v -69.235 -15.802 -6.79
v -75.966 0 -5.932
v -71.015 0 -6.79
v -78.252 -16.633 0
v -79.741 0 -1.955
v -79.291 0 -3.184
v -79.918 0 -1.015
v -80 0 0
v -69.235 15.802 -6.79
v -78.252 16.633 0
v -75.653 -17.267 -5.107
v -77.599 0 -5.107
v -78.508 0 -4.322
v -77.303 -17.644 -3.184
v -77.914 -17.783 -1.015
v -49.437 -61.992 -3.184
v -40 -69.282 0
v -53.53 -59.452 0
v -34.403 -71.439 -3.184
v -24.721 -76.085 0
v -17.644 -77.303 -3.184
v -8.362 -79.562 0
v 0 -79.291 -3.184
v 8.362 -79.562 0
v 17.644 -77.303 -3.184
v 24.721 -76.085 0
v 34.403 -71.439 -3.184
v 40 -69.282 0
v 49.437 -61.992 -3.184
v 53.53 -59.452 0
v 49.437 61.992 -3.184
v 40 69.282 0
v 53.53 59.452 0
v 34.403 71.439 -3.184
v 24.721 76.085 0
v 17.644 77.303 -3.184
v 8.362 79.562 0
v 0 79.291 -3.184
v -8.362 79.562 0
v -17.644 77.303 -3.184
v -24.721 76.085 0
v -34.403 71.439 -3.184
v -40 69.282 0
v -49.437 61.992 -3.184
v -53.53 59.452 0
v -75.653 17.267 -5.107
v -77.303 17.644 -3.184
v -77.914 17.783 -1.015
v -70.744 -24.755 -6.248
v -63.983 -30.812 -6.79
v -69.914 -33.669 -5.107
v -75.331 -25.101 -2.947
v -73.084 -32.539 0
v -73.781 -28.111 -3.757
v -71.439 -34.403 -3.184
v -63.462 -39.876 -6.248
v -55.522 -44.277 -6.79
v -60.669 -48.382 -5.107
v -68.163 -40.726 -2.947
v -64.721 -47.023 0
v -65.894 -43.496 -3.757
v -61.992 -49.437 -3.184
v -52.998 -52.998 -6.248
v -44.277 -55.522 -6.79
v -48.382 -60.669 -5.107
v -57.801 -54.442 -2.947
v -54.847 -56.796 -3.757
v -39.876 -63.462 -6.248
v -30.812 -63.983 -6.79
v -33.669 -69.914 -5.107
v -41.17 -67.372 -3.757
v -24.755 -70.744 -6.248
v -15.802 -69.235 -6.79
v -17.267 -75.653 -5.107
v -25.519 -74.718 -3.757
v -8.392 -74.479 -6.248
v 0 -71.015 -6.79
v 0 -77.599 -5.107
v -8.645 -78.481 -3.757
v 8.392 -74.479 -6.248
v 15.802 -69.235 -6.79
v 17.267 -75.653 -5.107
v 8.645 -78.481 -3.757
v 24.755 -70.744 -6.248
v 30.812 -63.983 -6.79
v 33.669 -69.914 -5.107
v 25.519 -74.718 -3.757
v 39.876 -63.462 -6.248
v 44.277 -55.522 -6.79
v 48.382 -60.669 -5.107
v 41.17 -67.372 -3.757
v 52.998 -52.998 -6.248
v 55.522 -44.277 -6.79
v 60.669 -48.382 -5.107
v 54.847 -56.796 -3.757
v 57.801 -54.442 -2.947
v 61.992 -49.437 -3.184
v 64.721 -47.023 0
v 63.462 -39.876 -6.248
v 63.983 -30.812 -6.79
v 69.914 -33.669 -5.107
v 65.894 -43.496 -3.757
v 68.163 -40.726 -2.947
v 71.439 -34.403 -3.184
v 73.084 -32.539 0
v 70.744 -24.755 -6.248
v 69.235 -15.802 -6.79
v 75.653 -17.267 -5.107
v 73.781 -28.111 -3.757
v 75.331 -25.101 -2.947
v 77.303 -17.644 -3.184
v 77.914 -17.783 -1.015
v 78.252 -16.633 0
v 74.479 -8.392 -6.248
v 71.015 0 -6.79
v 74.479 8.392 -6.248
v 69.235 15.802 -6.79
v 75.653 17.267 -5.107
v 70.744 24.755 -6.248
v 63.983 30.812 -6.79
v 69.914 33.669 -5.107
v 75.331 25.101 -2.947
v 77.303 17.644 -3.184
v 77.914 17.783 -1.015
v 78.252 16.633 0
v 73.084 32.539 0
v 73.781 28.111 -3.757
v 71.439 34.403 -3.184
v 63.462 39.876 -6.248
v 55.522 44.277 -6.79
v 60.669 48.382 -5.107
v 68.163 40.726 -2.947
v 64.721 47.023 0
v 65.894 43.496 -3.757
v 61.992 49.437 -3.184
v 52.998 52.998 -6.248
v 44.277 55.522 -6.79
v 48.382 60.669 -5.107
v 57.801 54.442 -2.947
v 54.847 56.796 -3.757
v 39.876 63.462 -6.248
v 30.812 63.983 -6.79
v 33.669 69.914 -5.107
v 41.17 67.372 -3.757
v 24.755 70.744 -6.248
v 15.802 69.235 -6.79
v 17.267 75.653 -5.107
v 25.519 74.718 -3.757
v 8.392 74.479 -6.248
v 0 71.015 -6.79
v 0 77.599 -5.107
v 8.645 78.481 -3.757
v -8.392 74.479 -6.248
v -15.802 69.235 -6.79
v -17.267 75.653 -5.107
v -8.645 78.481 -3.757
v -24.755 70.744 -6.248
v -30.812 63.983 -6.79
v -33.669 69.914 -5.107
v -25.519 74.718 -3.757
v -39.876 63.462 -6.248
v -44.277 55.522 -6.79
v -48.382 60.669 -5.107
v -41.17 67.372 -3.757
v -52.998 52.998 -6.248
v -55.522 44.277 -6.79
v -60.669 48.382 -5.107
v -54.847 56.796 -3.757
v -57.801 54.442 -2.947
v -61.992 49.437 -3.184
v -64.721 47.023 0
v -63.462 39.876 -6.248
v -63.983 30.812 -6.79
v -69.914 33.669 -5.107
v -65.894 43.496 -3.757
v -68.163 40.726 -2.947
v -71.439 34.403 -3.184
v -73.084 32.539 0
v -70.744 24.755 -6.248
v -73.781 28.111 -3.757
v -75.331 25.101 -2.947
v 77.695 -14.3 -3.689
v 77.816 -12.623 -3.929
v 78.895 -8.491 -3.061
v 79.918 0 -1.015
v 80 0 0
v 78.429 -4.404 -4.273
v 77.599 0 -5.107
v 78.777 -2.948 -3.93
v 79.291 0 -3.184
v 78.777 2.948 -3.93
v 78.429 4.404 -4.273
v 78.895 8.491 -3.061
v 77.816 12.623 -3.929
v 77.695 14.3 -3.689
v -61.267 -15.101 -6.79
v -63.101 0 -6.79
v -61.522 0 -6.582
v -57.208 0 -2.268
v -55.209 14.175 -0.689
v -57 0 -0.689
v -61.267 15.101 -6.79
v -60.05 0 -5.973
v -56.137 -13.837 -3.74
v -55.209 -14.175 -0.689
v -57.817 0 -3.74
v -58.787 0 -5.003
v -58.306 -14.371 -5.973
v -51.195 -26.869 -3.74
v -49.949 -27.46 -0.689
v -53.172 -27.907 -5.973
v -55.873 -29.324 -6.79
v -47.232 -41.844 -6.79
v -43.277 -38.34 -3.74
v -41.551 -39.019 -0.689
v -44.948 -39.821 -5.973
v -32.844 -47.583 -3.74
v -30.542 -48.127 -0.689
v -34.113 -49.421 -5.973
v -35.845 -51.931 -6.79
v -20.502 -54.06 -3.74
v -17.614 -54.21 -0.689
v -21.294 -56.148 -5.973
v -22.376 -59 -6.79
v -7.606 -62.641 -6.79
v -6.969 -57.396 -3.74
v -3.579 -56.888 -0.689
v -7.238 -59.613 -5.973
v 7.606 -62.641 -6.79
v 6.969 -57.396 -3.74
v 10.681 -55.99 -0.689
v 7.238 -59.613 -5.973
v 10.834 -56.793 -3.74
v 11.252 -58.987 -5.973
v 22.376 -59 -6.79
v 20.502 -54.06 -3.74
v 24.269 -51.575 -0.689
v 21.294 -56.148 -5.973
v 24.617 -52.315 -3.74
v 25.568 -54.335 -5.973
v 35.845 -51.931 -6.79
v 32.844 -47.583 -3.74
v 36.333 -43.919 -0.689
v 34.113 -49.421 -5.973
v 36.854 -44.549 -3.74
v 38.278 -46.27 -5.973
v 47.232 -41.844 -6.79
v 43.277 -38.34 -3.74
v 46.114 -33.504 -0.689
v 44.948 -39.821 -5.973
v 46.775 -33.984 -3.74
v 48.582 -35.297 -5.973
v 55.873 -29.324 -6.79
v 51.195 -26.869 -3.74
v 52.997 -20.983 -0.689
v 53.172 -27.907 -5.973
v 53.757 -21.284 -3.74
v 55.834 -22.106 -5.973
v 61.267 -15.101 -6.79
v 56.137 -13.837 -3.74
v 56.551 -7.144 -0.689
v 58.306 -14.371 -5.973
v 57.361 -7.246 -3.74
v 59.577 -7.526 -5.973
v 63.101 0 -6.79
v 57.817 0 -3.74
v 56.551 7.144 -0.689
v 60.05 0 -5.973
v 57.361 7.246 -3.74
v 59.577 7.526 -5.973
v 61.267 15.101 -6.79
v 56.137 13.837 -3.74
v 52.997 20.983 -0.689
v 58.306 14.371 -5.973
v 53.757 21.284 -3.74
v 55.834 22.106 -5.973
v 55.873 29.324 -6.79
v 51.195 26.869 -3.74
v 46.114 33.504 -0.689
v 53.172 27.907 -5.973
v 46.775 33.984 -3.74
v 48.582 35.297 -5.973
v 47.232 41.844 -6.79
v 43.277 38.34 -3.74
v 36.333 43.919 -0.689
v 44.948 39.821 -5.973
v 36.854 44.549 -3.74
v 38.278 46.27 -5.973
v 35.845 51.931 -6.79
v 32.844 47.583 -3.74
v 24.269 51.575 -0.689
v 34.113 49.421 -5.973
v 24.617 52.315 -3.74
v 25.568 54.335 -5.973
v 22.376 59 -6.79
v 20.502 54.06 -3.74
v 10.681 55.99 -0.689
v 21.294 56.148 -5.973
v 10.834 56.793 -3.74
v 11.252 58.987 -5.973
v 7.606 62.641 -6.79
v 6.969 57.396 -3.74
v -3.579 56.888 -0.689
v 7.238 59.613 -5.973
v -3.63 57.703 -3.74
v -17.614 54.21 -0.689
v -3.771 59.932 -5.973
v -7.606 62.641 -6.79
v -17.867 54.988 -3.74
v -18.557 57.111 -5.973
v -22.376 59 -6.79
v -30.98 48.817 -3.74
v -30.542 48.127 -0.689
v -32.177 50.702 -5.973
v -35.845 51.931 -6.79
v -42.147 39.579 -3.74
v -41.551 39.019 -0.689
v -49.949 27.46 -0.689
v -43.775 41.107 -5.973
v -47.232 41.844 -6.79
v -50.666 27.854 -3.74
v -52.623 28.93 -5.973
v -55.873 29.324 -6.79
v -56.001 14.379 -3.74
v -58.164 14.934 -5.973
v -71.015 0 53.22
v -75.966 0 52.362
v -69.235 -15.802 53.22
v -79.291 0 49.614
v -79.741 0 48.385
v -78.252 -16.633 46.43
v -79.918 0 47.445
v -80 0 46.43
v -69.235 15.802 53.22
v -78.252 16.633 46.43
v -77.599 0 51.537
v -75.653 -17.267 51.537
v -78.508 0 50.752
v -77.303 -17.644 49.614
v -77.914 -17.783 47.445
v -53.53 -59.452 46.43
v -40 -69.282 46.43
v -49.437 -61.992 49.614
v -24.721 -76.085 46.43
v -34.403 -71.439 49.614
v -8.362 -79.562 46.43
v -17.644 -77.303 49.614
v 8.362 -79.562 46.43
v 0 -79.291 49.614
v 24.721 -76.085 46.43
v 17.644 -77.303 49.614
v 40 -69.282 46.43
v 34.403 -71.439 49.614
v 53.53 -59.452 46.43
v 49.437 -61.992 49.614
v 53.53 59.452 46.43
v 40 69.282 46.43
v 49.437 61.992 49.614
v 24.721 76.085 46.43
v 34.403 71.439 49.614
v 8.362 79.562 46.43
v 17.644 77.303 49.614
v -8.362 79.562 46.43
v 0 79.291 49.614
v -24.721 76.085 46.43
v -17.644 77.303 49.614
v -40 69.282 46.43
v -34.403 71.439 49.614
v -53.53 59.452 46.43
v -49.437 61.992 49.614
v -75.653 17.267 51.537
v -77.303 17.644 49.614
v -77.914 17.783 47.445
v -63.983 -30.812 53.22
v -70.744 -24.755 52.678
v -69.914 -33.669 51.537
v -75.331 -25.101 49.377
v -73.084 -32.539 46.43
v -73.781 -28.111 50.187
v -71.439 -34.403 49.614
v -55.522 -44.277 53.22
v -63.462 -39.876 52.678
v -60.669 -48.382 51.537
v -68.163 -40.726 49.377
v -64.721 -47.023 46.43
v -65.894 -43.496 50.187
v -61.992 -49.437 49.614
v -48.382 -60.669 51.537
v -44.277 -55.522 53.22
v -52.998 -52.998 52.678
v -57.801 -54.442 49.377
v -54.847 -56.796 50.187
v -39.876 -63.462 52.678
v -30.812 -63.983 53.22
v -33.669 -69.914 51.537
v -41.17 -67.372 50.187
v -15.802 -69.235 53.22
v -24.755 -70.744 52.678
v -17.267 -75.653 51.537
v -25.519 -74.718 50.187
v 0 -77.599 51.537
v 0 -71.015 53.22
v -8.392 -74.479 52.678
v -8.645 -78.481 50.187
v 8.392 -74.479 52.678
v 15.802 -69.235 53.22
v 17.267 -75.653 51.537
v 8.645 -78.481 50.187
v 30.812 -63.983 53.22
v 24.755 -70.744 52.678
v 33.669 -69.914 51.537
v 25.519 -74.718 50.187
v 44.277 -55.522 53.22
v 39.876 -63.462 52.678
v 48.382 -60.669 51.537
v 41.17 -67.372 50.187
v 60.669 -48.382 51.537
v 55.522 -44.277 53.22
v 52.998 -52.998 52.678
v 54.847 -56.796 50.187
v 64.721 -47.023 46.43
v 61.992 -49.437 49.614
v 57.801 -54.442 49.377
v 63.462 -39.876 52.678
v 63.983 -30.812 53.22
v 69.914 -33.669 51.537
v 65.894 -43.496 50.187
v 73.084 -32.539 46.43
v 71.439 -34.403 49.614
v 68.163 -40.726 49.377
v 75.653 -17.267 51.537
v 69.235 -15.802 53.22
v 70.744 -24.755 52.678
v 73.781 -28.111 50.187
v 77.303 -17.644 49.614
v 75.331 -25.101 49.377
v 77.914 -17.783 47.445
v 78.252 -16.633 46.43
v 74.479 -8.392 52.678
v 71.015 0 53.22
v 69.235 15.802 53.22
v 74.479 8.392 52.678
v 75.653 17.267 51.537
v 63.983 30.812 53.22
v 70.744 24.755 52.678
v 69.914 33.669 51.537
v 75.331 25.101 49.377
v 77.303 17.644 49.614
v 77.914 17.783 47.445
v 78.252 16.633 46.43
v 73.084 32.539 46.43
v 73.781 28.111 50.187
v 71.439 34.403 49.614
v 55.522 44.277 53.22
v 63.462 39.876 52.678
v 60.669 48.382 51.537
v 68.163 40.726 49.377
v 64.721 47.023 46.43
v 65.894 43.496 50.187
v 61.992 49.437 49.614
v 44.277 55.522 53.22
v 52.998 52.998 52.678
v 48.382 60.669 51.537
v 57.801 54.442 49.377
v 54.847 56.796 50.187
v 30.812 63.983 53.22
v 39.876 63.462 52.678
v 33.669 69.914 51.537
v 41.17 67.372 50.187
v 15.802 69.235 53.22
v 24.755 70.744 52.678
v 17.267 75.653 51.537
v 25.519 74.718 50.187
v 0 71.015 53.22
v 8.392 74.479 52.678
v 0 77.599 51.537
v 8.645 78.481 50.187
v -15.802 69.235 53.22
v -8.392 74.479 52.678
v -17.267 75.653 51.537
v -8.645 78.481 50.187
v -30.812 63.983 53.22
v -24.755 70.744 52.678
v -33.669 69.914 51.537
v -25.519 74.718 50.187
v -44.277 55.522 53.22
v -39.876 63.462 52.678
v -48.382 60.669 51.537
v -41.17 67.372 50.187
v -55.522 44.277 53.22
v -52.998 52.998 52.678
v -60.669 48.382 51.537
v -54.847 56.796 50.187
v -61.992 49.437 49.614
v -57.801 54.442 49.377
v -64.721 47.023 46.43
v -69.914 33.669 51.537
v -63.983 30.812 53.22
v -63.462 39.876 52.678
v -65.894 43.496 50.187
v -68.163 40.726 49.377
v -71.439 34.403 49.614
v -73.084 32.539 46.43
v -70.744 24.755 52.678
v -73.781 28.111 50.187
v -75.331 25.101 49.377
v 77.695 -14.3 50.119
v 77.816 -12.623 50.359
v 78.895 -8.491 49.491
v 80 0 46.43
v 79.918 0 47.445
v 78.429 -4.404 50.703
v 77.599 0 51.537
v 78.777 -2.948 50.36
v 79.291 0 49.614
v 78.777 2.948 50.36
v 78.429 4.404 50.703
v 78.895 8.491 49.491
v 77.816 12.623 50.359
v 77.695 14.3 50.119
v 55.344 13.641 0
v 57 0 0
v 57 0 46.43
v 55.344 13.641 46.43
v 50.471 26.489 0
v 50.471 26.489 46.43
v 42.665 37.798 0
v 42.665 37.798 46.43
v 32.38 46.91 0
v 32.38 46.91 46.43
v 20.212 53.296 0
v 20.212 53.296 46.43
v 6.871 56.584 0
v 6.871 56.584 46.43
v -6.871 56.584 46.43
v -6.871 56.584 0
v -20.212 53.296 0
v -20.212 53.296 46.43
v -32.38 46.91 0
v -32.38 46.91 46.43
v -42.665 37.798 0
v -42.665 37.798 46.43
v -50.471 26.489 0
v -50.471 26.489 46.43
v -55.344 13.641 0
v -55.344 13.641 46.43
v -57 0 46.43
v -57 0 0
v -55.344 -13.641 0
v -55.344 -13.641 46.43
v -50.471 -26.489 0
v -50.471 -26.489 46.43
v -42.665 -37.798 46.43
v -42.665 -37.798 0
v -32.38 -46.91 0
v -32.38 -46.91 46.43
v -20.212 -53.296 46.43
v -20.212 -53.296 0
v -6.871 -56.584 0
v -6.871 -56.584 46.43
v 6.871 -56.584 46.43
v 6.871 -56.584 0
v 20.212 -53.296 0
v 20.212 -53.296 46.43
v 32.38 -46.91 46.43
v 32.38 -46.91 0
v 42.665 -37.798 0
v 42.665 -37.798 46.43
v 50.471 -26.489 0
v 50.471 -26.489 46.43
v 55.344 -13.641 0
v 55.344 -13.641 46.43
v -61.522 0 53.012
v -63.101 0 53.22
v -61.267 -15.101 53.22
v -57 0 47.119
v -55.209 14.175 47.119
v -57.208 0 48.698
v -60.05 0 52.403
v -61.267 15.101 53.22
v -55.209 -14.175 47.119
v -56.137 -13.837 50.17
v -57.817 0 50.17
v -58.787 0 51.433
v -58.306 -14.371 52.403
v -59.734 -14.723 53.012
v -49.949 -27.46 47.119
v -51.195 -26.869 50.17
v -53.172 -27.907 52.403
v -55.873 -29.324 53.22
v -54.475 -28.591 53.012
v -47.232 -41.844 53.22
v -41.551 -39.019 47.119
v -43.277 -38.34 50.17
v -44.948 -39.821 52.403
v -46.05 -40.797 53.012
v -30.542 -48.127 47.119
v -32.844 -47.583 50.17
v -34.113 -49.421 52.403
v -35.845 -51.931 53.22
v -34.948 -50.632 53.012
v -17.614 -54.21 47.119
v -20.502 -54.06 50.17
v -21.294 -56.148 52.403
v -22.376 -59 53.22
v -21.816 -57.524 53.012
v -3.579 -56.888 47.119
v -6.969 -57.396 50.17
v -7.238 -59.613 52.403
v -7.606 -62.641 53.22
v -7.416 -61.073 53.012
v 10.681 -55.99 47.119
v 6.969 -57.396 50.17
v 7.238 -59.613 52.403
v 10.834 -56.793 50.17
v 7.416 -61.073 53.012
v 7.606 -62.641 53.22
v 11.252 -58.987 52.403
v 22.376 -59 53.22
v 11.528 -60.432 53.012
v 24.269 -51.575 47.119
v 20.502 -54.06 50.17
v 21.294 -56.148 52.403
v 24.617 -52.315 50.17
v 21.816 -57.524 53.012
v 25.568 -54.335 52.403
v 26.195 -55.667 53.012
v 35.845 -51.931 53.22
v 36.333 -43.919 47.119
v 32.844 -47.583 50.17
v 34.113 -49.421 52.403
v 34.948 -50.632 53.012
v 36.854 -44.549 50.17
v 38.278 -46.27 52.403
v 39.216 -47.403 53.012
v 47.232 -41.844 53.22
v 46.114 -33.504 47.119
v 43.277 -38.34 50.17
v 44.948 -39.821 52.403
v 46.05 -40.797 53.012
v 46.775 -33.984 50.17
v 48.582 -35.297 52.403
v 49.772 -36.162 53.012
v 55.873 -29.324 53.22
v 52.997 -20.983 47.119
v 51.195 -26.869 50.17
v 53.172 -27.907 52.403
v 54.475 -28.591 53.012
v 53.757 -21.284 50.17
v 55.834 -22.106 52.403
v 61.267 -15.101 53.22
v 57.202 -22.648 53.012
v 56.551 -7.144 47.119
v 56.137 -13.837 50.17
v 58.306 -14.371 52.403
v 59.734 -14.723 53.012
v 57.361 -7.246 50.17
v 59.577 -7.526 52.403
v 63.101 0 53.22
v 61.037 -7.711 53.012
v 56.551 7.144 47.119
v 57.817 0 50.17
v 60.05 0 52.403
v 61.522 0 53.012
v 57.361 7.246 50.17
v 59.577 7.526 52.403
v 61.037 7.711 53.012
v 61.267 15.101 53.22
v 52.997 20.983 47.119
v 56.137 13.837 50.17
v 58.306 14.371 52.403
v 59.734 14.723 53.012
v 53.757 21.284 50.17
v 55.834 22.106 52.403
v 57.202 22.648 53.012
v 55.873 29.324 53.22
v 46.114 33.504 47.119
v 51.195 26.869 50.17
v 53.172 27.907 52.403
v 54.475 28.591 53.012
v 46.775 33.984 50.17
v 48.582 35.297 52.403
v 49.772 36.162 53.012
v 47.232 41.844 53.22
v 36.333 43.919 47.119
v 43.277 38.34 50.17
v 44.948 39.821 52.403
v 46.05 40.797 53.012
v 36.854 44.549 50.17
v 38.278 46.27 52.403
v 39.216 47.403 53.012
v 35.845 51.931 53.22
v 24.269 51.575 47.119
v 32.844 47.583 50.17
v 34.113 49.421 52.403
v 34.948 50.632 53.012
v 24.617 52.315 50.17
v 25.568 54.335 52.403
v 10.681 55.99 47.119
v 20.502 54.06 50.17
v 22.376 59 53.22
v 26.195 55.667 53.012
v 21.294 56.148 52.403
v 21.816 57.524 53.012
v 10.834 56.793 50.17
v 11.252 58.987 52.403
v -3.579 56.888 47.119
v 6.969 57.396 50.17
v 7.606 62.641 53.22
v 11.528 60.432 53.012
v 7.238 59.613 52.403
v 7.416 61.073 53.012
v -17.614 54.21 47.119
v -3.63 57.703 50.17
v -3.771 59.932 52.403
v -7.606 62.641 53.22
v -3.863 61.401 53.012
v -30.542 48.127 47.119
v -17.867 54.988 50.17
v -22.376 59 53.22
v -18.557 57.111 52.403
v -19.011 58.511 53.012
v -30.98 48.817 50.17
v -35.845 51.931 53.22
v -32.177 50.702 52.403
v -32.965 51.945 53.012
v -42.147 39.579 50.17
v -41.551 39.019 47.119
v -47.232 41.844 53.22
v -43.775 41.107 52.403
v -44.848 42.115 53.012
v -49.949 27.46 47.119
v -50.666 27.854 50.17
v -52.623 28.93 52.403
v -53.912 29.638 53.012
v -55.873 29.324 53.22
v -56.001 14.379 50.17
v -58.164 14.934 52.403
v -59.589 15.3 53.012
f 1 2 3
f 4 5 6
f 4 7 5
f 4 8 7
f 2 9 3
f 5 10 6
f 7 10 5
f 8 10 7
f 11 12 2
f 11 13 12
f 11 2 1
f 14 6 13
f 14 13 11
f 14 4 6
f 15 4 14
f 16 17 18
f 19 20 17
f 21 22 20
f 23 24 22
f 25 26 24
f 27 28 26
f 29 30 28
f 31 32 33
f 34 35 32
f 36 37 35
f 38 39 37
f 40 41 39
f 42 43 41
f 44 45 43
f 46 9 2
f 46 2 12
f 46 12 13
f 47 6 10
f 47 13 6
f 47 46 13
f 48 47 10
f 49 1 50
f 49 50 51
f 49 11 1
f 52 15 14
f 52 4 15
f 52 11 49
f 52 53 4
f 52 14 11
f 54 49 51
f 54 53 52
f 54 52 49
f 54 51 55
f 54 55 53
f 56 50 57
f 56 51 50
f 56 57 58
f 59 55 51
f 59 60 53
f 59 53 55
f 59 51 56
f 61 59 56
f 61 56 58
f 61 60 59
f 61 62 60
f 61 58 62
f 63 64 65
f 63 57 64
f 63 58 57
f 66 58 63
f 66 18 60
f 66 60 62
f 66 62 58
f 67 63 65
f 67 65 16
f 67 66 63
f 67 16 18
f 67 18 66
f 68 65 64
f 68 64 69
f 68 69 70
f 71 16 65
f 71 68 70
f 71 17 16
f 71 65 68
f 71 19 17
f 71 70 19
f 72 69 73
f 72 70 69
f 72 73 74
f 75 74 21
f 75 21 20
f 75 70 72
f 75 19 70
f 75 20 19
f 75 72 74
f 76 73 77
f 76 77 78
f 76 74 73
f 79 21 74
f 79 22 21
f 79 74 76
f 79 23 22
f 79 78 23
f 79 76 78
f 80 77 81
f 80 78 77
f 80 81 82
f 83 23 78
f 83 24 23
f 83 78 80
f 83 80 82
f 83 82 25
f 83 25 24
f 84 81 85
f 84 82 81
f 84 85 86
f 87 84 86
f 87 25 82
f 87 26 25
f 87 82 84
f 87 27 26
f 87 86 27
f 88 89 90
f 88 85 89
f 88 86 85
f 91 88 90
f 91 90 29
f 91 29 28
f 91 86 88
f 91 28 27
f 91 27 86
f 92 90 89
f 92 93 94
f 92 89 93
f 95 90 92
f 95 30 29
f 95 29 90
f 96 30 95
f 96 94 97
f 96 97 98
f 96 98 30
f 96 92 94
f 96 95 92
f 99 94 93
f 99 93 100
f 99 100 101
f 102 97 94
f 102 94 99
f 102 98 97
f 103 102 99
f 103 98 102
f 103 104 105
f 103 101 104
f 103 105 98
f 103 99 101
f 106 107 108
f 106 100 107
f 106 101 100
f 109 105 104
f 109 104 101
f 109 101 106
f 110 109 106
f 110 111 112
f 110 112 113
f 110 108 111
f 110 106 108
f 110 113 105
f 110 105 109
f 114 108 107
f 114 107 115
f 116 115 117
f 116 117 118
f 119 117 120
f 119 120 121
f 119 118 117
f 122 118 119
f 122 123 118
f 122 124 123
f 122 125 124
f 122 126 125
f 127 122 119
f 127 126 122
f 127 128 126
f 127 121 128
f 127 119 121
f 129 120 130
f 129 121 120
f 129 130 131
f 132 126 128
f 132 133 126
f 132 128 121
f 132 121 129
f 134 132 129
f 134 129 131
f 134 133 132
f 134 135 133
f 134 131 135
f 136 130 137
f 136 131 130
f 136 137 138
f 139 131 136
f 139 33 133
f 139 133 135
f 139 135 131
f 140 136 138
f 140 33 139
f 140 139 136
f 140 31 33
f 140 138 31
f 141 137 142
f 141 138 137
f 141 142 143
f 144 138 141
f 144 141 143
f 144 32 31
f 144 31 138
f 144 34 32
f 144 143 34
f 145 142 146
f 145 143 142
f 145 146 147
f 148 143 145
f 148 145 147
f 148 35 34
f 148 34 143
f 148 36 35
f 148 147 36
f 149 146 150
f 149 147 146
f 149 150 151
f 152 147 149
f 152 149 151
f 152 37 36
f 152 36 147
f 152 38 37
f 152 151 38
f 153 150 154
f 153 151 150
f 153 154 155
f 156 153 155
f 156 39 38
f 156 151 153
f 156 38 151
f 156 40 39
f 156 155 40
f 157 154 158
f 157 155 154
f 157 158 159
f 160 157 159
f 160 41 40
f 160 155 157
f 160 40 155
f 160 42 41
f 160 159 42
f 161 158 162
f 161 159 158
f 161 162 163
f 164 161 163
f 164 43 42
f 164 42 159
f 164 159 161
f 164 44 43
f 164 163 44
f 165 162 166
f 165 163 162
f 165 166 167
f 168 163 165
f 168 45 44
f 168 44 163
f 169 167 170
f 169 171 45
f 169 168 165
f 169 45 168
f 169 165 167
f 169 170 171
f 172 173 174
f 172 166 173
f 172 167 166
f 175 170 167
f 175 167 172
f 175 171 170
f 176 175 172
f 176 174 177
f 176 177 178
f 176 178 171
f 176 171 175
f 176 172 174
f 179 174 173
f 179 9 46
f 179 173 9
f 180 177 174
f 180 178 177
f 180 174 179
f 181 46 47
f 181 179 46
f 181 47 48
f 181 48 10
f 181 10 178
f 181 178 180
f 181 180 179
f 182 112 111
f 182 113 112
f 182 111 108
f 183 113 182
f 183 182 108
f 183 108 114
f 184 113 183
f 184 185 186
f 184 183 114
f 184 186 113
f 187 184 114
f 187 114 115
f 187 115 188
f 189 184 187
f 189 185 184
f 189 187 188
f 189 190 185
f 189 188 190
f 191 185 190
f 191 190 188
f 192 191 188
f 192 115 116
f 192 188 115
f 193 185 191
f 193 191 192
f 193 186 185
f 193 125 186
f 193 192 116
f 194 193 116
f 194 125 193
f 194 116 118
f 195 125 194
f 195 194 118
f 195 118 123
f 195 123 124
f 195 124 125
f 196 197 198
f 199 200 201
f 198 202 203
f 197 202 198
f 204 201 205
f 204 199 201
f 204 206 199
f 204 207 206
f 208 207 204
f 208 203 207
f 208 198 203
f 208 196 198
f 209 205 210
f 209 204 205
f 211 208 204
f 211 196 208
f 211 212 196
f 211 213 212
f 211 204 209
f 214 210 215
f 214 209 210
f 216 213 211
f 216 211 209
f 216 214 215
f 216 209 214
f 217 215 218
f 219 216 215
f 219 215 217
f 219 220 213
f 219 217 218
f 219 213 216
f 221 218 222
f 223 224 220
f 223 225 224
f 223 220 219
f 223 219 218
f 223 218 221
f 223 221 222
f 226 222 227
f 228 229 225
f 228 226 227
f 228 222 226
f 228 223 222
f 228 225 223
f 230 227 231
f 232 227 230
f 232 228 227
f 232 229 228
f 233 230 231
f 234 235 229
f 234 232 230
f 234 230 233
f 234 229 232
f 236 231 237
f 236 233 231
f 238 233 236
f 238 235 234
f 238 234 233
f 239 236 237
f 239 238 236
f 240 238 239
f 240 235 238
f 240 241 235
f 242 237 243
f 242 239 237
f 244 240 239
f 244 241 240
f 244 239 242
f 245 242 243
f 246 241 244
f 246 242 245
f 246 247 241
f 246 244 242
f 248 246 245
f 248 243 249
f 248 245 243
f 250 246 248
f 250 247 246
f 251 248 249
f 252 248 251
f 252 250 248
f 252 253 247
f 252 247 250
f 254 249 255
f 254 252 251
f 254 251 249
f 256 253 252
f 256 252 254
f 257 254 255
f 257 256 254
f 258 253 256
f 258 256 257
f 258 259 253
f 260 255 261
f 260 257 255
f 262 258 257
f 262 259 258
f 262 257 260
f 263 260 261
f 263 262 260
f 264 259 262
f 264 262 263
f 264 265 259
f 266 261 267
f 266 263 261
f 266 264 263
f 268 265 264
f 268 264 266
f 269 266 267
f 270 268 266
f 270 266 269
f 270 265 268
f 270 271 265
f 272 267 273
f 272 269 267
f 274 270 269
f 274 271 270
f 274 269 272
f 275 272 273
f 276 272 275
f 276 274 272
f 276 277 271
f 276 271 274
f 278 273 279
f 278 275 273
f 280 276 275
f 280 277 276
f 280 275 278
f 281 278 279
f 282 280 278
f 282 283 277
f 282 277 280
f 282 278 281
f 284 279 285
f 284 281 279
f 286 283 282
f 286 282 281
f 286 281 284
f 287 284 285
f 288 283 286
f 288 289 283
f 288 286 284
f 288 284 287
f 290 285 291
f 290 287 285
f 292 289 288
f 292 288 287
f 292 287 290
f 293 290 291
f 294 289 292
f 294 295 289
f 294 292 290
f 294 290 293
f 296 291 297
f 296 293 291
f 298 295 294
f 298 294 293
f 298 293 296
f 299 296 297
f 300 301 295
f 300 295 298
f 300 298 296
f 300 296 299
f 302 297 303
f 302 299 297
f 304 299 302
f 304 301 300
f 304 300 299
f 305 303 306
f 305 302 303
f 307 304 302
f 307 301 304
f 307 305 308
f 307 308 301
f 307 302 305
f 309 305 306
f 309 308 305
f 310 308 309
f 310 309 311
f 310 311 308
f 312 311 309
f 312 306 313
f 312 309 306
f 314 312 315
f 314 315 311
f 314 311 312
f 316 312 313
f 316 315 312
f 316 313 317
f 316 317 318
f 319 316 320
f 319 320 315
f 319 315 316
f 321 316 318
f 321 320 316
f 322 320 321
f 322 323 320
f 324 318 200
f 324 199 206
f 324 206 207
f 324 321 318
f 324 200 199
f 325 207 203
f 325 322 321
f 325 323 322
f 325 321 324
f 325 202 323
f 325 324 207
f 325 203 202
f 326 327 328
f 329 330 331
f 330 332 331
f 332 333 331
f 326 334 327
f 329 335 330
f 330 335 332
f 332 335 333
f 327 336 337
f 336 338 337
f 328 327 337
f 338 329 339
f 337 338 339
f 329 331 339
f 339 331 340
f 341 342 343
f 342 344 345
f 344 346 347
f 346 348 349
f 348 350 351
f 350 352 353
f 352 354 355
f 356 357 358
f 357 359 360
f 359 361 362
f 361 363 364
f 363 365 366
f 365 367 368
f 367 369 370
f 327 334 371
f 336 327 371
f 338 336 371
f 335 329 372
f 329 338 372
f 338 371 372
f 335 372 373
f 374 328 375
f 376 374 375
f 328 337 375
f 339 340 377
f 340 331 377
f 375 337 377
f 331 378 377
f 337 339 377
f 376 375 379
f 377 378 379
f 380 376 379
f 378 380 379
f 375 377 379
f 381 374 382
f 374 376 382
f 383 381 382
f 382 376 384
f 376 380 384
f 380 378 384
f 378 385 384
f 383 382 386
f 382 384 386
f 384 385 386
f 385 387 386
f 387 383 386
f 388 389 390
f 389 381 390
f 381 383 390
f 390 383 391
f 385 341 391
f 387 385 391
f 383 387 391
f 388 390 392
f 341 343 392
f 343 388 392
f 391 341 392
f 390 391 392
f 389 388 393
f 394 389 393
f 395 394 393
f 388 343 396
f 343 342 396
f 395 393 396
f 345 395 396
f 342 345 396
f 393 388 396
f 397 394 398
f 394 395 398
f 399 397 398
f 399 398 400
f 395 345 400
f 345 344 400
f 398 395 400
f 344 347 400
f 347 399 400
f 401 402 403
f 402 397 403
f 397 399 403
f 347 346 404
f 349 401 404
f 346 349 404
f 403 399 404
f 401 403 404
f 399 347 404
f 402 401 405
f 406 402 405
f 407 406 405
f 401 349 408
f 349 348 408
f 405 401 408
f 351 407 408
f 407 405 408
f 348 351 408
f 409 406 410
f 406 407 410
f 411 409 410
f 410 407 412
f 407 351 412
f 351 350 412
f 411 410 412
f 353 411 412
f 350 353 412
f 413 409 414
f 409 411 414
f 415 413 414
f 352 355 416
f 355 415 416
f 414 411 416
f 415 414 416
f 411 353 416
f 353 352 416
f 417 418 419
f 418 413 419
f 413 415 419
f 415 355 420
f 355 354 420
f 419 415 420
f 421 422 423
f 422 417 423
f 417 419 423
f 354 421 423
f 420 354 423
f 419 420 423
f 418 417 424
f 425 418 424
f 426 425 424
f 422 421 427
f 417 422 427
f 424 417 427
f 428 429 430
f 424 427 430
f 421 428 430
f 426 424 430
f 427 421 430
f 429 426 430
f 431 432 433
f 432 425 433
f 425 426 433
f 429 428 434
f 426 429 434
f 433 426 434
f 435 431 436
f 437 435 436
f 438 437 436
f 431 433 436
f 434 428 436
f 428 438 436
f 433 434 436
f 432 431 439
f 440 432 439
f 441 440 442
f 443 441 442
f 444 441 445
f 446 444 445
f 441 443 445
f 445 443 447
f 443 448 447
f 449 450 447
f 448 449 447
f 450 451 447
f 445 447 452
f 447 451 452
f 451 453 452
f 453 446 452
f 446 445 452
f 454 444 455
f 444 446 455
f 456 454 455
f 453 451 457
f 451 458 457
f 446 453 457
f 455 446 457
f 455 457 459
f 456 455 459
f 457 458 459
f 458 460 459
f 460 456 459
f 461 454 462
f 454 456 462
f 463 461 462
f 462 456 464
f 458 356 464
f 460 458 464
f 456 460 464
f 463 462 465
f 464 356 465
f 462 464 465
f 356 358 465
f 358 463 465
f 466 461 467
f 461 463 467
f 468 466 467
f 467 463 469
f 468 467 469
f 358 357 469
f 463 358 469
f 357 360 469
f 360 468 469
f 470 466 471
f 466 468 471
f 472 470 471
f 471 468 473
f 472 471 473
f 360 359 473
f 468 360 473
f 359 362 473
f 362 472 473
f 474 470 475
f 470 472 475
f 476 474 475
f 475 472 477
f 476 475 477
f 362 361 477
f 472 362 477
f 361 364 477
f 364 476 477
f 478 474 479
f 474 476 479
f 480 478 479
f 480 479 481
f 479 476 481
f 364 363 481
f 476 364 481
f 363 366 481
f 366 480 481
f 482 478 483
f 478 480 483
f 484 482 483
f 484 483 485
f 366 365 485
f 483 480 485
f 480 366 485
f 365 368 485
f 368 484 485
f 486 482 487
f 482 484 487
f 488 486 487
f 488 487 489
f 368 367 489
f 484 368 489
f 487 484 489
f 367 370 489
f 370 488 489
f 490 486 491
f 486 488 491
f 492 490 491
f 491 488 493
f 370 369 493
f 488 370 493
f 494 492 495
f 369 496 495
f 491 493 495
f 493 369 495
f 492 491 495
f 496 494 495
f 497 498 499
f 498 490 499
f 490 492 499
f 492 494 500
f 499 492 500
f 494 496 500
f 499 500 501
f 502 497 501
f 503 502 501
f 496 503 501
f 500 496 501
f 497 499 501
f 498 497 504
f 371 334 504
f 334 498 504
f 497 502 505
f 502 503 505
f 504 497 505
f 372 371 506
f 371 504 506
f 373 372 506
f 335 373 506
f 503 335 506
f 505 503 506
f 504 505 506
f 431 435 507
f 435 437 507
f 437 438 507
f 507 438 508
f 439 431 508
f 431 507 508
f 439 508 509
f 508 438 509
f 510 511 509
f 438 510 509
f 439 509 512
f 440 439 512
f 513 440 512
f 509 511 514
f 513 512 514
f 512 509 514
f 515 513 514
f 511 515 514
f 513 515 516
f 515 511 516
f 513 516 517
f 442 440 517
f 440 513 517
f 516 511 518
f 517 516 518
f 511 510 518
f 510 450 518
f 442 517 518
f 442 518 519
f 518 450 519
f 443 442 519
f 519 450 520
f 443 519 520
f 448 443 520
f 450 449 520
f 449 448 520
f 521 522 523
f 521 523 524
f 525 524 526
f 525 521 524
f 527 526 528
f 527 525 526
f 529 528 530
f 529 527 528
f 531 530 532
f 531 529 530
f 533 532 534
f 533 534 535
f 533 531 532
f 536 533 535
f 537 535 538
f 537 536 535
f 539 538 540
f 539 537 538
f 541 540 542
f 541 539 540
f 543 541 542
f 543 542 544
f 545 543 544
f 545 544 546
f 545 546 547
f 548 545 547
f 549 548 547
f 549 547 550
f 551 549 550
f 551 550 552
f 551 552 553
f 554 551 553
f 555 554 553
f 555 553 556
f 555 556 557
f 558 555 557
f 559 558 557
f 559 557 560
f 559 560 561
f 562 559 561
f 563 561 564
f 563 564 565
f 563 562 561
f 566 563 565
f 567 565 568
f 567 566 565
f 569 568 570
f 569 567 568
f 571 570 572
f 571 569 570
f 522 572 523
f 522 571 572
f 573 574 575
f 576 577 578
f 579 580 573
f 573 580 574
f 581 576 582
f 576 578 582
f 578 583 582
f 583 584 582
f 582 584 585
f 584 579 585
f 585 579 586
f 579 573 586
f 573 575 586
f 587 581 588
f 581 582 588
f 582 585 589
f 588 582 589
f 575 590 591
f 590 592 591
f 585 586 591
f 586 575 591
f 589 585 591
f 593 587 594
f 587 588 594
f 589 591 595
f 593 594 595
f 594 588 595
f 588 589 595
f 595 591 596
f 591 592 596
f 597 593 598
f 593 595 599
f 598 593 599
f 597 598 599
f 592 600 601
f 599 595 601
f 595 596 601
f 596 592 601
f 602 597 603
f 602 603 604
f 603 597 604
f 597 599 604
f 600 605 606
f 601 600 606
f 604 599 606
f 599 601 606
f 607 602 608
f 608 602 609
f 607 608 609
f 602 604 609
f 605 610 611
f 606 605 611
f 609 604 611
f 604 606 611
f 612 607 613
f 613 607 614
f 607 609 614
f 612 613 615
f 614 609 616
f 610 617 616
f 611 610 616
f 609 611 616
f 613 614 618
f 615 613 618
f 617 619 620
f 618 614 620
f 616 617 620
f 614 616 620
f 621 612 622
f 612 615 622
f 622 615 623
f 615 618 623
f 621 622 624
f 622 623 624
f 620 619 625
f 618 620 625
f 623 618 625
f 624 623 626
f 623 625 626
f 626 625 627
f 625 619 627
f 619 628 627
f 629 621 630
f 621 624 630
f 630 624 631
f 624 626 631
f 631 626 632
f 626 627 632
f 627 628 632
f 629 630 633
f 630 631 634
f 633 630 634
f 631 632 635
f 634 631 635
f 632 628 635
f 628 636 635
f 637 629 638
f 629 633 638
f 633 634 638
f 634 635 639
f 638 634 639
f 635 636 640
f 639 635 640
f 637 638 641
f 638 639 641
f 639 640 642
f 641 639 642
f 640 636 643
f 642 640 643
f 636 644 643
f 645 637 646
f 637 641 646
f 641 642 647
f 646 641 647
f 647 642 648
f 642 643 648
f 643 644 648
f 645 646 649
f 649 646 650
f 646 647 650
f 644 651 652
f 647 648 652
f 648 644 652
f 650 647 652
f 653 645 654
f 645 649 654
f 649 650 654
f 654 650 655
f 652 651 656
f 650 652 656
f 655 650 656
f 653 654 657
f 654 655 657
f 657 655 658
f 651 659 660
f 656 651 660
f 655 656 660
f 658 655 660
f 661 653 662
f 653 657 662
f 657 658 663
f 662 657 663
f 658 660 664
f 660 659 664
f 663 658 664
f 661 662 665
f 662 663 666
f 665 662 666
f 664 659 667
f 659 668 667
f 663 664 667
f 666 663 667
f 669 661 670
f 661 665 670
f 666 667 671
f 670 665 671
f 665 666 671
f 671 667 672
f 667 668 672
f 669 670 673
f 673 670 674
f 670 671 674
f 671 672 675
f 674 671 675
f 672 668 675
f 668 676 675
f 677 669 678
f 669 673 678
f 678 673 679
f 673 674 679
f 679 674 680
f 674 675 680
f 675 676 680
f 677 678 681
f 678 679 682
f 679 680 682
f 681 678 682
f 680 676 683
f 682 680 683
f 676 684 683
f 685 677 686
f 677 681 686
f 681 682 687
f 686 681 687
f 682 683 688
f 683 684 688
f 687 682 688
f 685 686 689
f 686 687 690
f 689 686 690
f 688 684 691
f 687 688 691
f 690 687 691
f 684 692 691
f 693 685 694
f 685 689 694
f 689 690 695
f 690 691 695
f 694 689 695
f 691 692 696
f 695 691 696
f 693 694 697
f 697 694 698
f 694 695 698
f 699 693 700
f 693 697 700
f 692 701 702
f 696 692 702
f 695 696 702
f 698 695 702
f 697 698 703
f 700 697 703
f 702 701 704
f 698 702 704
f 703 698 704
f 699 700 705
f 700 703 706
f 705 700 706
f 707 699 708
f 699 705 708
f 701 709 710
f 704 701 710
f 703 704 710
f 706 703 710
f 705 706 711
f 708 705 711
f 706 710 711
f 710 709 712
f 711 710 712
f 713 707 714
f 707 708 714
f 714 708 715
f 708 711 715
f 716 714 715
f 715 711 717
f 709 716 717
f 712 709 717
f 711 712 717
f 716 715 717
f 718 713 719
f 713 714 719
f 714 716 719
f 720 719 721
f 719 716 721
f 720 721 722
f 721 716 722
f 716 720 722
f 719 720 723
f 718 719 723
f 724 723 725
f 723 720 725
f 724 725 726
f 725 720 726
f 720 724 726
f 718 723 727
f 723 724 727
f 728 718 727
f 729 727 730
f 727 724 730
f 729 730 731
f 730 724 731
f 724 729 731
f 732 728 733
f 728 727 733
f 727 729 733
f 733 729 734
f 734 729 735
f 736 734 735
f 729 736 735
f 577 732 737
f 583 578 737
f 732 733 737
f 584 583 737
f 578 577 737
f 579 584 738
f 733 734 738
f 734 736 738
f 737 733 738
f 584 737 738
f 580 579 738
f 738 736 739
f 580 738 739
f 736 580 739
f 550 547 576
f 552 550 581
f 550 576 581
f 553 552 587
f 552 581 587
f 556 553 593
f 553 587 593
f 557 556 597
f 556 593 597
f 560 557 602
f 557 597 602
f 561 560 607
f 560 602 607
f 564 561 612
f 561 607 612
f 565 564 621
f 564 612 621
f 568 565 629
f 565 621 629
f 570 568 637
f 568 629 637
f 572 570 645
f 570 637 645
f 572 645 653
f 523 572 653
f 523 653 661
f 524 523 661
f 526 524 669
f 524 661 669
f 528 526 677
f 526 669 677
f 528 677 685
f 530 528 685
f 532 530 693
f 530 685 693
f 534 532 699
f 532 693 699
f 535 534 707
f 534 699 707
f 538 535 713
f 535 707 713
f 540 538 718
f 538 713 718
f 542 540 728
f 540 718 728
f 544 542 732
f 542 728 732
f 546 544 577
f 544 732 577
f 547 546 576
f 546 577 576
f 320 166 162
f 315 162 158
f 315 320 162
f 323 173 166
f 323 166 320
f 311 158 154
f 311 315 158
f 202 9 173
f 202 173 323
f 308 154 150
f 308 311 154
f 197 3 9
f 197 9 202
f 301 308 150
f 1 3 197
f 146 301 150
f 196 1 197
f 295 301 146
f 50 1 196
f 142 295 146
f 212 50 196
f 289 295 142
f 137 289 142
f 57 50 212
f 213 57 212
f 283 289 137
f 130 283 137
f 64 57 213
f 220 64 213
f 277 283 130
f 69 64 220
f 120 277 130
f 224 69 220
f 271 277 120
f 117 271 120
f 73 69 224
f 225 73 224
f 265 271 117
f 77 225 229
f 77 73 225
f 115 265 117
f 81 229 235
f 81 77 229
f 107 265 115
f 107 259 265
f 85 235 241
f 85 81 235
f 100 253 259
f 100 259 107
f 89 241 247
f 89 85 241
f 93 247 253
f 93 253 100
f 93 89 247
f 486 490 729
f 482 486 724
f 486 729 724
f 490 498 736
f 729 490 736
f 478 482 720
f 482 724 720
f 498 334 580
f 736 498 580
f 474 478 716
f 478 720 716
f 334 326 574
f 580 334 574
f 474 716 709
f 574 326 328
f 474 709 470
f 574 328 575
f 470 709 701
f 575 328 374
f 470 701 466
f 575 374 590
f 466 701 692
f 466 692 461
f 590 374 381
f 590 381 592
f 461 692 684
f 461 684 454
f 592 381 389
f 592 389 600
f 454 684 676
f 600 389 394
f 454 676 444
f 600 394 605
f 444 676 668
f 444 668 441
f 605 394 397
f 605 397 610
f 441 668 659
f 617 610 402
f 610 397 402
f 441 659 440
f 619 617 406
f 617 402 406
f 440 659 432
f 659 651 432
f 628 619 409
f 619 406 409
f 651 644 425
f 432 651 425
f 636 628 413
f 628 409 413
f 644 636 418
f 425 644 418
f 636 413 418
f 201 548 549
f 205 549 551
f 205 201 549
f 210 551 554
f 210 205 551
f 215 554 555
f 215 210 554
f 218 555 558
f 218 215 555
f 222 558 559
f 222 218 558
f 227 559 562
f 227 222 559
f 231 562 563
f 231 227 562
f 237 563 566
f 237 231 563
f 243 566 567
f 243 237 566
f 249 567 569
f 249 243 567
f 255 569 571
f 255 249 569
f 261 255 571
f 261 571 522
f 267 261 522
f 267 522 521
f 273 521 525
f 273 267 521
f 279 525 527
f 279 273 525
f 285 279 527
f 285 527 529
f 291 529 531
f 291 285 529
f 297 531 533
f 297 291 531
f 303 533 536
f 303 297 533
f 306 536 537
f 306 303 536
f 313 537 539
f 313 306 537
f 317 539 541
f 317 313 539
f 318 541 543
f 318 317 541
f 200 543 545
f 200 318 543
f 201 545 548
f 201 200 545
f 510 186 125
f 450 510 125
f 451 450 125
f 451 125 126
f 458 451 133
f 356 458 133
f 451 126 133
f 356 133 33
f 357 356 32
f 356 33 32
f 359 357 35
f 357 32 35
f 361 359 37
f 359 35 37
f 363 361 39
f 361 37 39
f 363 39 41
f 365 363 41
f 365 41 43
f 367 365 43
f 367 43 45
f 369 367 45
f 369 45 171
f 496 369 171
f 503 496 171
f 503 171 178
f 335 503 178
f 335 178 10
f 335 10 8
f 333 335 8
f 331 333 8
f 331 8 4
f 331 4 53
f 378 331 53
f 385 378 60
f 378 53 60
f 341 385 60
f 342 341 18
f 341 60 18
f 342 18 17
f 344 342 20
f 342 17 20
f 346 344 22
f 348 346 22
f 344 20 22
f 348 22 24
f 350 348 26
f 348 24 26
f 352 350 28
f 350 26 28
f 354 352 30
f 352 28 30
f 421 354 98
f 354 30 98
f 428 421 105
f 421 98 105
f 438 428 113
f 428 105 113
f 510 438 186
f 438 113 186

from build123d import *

# Parameters (mm, degrees)
ESQUISSE1_R        = 80
ESQUISSE1_R_2      = 57
BOSS_EXTRU_1_DEPTH = 46.43


with BuildPart() as part:
    # Esquisse1 → Boss.-Extru.1 (new body)
    with BuildSketch(Plane.XY):
        Circle(ESQUISSE1_R)
        Circle(ESQUISSE1_R_2, mode=Mode.SUBTRACT)
    extrude(amount=BOSS_EXTRU_1_DEPTH)

    # Esquisse2 → Révolution1 (revolve)
    with BuildSketch(Plane(origin=(0, 0, 0), x_dir=(0, 0, -1), z_dir=(1, 0, 0)), mode=Mode.PRIVATE) as r_volution1_sk:
        with BuildLine():
            Line((0, 57), (0.689038023, 57))
            ThreePointArc((0.689038023, 57), (5.003069609, 58.786930391), (6.79, 63.100961977))
            Line((6.79, 63.100961977), (6.79, 64))
            Line((6.79, 64), (6.79, 71.015274994))
            add(Edge.make_bspline(
                [(6.79, 71.015274994), (6.446653278, 77.904299494), (4.024026126, 79.849265176), (0, 80)],
                knots=[0, 0, 0, 0, 1, 1, 1, 1], degree=3))
            Line((0, 80), (0, 57))
        make_face()
        with BuildLine():
            Line((-46.43, 57), (-47.119038023, 57))
            ThreePointArc((-47.119038023, 57), (-51.433069609, 58.786930391), (-53.22, 63.100961977))
            Line((-53.22, 63.100961977), (-53.22, 64))
            Line((-53.22, 64), (-53.22, 71.015274994))
            add(Edge.make_bspline(
                [(-53.22, 71.015274994), (-52.876653278, 77.904299494), (-50.454026126, 79.849265176), (-46.43, 80)],
                knots=[0, 0, 0, 0, 1, 1, 1, 1], degree=3))
            Line((-46.43, 80), (-46.43, 57))
        make_face()
    revolve(r_volution1_sk.sketch.rotate(Axis((0, 0, 0), (0, 0, 1)), 90), axis=Axis((0, 0, 0), (0, 0, 1)))


solid = part.part
